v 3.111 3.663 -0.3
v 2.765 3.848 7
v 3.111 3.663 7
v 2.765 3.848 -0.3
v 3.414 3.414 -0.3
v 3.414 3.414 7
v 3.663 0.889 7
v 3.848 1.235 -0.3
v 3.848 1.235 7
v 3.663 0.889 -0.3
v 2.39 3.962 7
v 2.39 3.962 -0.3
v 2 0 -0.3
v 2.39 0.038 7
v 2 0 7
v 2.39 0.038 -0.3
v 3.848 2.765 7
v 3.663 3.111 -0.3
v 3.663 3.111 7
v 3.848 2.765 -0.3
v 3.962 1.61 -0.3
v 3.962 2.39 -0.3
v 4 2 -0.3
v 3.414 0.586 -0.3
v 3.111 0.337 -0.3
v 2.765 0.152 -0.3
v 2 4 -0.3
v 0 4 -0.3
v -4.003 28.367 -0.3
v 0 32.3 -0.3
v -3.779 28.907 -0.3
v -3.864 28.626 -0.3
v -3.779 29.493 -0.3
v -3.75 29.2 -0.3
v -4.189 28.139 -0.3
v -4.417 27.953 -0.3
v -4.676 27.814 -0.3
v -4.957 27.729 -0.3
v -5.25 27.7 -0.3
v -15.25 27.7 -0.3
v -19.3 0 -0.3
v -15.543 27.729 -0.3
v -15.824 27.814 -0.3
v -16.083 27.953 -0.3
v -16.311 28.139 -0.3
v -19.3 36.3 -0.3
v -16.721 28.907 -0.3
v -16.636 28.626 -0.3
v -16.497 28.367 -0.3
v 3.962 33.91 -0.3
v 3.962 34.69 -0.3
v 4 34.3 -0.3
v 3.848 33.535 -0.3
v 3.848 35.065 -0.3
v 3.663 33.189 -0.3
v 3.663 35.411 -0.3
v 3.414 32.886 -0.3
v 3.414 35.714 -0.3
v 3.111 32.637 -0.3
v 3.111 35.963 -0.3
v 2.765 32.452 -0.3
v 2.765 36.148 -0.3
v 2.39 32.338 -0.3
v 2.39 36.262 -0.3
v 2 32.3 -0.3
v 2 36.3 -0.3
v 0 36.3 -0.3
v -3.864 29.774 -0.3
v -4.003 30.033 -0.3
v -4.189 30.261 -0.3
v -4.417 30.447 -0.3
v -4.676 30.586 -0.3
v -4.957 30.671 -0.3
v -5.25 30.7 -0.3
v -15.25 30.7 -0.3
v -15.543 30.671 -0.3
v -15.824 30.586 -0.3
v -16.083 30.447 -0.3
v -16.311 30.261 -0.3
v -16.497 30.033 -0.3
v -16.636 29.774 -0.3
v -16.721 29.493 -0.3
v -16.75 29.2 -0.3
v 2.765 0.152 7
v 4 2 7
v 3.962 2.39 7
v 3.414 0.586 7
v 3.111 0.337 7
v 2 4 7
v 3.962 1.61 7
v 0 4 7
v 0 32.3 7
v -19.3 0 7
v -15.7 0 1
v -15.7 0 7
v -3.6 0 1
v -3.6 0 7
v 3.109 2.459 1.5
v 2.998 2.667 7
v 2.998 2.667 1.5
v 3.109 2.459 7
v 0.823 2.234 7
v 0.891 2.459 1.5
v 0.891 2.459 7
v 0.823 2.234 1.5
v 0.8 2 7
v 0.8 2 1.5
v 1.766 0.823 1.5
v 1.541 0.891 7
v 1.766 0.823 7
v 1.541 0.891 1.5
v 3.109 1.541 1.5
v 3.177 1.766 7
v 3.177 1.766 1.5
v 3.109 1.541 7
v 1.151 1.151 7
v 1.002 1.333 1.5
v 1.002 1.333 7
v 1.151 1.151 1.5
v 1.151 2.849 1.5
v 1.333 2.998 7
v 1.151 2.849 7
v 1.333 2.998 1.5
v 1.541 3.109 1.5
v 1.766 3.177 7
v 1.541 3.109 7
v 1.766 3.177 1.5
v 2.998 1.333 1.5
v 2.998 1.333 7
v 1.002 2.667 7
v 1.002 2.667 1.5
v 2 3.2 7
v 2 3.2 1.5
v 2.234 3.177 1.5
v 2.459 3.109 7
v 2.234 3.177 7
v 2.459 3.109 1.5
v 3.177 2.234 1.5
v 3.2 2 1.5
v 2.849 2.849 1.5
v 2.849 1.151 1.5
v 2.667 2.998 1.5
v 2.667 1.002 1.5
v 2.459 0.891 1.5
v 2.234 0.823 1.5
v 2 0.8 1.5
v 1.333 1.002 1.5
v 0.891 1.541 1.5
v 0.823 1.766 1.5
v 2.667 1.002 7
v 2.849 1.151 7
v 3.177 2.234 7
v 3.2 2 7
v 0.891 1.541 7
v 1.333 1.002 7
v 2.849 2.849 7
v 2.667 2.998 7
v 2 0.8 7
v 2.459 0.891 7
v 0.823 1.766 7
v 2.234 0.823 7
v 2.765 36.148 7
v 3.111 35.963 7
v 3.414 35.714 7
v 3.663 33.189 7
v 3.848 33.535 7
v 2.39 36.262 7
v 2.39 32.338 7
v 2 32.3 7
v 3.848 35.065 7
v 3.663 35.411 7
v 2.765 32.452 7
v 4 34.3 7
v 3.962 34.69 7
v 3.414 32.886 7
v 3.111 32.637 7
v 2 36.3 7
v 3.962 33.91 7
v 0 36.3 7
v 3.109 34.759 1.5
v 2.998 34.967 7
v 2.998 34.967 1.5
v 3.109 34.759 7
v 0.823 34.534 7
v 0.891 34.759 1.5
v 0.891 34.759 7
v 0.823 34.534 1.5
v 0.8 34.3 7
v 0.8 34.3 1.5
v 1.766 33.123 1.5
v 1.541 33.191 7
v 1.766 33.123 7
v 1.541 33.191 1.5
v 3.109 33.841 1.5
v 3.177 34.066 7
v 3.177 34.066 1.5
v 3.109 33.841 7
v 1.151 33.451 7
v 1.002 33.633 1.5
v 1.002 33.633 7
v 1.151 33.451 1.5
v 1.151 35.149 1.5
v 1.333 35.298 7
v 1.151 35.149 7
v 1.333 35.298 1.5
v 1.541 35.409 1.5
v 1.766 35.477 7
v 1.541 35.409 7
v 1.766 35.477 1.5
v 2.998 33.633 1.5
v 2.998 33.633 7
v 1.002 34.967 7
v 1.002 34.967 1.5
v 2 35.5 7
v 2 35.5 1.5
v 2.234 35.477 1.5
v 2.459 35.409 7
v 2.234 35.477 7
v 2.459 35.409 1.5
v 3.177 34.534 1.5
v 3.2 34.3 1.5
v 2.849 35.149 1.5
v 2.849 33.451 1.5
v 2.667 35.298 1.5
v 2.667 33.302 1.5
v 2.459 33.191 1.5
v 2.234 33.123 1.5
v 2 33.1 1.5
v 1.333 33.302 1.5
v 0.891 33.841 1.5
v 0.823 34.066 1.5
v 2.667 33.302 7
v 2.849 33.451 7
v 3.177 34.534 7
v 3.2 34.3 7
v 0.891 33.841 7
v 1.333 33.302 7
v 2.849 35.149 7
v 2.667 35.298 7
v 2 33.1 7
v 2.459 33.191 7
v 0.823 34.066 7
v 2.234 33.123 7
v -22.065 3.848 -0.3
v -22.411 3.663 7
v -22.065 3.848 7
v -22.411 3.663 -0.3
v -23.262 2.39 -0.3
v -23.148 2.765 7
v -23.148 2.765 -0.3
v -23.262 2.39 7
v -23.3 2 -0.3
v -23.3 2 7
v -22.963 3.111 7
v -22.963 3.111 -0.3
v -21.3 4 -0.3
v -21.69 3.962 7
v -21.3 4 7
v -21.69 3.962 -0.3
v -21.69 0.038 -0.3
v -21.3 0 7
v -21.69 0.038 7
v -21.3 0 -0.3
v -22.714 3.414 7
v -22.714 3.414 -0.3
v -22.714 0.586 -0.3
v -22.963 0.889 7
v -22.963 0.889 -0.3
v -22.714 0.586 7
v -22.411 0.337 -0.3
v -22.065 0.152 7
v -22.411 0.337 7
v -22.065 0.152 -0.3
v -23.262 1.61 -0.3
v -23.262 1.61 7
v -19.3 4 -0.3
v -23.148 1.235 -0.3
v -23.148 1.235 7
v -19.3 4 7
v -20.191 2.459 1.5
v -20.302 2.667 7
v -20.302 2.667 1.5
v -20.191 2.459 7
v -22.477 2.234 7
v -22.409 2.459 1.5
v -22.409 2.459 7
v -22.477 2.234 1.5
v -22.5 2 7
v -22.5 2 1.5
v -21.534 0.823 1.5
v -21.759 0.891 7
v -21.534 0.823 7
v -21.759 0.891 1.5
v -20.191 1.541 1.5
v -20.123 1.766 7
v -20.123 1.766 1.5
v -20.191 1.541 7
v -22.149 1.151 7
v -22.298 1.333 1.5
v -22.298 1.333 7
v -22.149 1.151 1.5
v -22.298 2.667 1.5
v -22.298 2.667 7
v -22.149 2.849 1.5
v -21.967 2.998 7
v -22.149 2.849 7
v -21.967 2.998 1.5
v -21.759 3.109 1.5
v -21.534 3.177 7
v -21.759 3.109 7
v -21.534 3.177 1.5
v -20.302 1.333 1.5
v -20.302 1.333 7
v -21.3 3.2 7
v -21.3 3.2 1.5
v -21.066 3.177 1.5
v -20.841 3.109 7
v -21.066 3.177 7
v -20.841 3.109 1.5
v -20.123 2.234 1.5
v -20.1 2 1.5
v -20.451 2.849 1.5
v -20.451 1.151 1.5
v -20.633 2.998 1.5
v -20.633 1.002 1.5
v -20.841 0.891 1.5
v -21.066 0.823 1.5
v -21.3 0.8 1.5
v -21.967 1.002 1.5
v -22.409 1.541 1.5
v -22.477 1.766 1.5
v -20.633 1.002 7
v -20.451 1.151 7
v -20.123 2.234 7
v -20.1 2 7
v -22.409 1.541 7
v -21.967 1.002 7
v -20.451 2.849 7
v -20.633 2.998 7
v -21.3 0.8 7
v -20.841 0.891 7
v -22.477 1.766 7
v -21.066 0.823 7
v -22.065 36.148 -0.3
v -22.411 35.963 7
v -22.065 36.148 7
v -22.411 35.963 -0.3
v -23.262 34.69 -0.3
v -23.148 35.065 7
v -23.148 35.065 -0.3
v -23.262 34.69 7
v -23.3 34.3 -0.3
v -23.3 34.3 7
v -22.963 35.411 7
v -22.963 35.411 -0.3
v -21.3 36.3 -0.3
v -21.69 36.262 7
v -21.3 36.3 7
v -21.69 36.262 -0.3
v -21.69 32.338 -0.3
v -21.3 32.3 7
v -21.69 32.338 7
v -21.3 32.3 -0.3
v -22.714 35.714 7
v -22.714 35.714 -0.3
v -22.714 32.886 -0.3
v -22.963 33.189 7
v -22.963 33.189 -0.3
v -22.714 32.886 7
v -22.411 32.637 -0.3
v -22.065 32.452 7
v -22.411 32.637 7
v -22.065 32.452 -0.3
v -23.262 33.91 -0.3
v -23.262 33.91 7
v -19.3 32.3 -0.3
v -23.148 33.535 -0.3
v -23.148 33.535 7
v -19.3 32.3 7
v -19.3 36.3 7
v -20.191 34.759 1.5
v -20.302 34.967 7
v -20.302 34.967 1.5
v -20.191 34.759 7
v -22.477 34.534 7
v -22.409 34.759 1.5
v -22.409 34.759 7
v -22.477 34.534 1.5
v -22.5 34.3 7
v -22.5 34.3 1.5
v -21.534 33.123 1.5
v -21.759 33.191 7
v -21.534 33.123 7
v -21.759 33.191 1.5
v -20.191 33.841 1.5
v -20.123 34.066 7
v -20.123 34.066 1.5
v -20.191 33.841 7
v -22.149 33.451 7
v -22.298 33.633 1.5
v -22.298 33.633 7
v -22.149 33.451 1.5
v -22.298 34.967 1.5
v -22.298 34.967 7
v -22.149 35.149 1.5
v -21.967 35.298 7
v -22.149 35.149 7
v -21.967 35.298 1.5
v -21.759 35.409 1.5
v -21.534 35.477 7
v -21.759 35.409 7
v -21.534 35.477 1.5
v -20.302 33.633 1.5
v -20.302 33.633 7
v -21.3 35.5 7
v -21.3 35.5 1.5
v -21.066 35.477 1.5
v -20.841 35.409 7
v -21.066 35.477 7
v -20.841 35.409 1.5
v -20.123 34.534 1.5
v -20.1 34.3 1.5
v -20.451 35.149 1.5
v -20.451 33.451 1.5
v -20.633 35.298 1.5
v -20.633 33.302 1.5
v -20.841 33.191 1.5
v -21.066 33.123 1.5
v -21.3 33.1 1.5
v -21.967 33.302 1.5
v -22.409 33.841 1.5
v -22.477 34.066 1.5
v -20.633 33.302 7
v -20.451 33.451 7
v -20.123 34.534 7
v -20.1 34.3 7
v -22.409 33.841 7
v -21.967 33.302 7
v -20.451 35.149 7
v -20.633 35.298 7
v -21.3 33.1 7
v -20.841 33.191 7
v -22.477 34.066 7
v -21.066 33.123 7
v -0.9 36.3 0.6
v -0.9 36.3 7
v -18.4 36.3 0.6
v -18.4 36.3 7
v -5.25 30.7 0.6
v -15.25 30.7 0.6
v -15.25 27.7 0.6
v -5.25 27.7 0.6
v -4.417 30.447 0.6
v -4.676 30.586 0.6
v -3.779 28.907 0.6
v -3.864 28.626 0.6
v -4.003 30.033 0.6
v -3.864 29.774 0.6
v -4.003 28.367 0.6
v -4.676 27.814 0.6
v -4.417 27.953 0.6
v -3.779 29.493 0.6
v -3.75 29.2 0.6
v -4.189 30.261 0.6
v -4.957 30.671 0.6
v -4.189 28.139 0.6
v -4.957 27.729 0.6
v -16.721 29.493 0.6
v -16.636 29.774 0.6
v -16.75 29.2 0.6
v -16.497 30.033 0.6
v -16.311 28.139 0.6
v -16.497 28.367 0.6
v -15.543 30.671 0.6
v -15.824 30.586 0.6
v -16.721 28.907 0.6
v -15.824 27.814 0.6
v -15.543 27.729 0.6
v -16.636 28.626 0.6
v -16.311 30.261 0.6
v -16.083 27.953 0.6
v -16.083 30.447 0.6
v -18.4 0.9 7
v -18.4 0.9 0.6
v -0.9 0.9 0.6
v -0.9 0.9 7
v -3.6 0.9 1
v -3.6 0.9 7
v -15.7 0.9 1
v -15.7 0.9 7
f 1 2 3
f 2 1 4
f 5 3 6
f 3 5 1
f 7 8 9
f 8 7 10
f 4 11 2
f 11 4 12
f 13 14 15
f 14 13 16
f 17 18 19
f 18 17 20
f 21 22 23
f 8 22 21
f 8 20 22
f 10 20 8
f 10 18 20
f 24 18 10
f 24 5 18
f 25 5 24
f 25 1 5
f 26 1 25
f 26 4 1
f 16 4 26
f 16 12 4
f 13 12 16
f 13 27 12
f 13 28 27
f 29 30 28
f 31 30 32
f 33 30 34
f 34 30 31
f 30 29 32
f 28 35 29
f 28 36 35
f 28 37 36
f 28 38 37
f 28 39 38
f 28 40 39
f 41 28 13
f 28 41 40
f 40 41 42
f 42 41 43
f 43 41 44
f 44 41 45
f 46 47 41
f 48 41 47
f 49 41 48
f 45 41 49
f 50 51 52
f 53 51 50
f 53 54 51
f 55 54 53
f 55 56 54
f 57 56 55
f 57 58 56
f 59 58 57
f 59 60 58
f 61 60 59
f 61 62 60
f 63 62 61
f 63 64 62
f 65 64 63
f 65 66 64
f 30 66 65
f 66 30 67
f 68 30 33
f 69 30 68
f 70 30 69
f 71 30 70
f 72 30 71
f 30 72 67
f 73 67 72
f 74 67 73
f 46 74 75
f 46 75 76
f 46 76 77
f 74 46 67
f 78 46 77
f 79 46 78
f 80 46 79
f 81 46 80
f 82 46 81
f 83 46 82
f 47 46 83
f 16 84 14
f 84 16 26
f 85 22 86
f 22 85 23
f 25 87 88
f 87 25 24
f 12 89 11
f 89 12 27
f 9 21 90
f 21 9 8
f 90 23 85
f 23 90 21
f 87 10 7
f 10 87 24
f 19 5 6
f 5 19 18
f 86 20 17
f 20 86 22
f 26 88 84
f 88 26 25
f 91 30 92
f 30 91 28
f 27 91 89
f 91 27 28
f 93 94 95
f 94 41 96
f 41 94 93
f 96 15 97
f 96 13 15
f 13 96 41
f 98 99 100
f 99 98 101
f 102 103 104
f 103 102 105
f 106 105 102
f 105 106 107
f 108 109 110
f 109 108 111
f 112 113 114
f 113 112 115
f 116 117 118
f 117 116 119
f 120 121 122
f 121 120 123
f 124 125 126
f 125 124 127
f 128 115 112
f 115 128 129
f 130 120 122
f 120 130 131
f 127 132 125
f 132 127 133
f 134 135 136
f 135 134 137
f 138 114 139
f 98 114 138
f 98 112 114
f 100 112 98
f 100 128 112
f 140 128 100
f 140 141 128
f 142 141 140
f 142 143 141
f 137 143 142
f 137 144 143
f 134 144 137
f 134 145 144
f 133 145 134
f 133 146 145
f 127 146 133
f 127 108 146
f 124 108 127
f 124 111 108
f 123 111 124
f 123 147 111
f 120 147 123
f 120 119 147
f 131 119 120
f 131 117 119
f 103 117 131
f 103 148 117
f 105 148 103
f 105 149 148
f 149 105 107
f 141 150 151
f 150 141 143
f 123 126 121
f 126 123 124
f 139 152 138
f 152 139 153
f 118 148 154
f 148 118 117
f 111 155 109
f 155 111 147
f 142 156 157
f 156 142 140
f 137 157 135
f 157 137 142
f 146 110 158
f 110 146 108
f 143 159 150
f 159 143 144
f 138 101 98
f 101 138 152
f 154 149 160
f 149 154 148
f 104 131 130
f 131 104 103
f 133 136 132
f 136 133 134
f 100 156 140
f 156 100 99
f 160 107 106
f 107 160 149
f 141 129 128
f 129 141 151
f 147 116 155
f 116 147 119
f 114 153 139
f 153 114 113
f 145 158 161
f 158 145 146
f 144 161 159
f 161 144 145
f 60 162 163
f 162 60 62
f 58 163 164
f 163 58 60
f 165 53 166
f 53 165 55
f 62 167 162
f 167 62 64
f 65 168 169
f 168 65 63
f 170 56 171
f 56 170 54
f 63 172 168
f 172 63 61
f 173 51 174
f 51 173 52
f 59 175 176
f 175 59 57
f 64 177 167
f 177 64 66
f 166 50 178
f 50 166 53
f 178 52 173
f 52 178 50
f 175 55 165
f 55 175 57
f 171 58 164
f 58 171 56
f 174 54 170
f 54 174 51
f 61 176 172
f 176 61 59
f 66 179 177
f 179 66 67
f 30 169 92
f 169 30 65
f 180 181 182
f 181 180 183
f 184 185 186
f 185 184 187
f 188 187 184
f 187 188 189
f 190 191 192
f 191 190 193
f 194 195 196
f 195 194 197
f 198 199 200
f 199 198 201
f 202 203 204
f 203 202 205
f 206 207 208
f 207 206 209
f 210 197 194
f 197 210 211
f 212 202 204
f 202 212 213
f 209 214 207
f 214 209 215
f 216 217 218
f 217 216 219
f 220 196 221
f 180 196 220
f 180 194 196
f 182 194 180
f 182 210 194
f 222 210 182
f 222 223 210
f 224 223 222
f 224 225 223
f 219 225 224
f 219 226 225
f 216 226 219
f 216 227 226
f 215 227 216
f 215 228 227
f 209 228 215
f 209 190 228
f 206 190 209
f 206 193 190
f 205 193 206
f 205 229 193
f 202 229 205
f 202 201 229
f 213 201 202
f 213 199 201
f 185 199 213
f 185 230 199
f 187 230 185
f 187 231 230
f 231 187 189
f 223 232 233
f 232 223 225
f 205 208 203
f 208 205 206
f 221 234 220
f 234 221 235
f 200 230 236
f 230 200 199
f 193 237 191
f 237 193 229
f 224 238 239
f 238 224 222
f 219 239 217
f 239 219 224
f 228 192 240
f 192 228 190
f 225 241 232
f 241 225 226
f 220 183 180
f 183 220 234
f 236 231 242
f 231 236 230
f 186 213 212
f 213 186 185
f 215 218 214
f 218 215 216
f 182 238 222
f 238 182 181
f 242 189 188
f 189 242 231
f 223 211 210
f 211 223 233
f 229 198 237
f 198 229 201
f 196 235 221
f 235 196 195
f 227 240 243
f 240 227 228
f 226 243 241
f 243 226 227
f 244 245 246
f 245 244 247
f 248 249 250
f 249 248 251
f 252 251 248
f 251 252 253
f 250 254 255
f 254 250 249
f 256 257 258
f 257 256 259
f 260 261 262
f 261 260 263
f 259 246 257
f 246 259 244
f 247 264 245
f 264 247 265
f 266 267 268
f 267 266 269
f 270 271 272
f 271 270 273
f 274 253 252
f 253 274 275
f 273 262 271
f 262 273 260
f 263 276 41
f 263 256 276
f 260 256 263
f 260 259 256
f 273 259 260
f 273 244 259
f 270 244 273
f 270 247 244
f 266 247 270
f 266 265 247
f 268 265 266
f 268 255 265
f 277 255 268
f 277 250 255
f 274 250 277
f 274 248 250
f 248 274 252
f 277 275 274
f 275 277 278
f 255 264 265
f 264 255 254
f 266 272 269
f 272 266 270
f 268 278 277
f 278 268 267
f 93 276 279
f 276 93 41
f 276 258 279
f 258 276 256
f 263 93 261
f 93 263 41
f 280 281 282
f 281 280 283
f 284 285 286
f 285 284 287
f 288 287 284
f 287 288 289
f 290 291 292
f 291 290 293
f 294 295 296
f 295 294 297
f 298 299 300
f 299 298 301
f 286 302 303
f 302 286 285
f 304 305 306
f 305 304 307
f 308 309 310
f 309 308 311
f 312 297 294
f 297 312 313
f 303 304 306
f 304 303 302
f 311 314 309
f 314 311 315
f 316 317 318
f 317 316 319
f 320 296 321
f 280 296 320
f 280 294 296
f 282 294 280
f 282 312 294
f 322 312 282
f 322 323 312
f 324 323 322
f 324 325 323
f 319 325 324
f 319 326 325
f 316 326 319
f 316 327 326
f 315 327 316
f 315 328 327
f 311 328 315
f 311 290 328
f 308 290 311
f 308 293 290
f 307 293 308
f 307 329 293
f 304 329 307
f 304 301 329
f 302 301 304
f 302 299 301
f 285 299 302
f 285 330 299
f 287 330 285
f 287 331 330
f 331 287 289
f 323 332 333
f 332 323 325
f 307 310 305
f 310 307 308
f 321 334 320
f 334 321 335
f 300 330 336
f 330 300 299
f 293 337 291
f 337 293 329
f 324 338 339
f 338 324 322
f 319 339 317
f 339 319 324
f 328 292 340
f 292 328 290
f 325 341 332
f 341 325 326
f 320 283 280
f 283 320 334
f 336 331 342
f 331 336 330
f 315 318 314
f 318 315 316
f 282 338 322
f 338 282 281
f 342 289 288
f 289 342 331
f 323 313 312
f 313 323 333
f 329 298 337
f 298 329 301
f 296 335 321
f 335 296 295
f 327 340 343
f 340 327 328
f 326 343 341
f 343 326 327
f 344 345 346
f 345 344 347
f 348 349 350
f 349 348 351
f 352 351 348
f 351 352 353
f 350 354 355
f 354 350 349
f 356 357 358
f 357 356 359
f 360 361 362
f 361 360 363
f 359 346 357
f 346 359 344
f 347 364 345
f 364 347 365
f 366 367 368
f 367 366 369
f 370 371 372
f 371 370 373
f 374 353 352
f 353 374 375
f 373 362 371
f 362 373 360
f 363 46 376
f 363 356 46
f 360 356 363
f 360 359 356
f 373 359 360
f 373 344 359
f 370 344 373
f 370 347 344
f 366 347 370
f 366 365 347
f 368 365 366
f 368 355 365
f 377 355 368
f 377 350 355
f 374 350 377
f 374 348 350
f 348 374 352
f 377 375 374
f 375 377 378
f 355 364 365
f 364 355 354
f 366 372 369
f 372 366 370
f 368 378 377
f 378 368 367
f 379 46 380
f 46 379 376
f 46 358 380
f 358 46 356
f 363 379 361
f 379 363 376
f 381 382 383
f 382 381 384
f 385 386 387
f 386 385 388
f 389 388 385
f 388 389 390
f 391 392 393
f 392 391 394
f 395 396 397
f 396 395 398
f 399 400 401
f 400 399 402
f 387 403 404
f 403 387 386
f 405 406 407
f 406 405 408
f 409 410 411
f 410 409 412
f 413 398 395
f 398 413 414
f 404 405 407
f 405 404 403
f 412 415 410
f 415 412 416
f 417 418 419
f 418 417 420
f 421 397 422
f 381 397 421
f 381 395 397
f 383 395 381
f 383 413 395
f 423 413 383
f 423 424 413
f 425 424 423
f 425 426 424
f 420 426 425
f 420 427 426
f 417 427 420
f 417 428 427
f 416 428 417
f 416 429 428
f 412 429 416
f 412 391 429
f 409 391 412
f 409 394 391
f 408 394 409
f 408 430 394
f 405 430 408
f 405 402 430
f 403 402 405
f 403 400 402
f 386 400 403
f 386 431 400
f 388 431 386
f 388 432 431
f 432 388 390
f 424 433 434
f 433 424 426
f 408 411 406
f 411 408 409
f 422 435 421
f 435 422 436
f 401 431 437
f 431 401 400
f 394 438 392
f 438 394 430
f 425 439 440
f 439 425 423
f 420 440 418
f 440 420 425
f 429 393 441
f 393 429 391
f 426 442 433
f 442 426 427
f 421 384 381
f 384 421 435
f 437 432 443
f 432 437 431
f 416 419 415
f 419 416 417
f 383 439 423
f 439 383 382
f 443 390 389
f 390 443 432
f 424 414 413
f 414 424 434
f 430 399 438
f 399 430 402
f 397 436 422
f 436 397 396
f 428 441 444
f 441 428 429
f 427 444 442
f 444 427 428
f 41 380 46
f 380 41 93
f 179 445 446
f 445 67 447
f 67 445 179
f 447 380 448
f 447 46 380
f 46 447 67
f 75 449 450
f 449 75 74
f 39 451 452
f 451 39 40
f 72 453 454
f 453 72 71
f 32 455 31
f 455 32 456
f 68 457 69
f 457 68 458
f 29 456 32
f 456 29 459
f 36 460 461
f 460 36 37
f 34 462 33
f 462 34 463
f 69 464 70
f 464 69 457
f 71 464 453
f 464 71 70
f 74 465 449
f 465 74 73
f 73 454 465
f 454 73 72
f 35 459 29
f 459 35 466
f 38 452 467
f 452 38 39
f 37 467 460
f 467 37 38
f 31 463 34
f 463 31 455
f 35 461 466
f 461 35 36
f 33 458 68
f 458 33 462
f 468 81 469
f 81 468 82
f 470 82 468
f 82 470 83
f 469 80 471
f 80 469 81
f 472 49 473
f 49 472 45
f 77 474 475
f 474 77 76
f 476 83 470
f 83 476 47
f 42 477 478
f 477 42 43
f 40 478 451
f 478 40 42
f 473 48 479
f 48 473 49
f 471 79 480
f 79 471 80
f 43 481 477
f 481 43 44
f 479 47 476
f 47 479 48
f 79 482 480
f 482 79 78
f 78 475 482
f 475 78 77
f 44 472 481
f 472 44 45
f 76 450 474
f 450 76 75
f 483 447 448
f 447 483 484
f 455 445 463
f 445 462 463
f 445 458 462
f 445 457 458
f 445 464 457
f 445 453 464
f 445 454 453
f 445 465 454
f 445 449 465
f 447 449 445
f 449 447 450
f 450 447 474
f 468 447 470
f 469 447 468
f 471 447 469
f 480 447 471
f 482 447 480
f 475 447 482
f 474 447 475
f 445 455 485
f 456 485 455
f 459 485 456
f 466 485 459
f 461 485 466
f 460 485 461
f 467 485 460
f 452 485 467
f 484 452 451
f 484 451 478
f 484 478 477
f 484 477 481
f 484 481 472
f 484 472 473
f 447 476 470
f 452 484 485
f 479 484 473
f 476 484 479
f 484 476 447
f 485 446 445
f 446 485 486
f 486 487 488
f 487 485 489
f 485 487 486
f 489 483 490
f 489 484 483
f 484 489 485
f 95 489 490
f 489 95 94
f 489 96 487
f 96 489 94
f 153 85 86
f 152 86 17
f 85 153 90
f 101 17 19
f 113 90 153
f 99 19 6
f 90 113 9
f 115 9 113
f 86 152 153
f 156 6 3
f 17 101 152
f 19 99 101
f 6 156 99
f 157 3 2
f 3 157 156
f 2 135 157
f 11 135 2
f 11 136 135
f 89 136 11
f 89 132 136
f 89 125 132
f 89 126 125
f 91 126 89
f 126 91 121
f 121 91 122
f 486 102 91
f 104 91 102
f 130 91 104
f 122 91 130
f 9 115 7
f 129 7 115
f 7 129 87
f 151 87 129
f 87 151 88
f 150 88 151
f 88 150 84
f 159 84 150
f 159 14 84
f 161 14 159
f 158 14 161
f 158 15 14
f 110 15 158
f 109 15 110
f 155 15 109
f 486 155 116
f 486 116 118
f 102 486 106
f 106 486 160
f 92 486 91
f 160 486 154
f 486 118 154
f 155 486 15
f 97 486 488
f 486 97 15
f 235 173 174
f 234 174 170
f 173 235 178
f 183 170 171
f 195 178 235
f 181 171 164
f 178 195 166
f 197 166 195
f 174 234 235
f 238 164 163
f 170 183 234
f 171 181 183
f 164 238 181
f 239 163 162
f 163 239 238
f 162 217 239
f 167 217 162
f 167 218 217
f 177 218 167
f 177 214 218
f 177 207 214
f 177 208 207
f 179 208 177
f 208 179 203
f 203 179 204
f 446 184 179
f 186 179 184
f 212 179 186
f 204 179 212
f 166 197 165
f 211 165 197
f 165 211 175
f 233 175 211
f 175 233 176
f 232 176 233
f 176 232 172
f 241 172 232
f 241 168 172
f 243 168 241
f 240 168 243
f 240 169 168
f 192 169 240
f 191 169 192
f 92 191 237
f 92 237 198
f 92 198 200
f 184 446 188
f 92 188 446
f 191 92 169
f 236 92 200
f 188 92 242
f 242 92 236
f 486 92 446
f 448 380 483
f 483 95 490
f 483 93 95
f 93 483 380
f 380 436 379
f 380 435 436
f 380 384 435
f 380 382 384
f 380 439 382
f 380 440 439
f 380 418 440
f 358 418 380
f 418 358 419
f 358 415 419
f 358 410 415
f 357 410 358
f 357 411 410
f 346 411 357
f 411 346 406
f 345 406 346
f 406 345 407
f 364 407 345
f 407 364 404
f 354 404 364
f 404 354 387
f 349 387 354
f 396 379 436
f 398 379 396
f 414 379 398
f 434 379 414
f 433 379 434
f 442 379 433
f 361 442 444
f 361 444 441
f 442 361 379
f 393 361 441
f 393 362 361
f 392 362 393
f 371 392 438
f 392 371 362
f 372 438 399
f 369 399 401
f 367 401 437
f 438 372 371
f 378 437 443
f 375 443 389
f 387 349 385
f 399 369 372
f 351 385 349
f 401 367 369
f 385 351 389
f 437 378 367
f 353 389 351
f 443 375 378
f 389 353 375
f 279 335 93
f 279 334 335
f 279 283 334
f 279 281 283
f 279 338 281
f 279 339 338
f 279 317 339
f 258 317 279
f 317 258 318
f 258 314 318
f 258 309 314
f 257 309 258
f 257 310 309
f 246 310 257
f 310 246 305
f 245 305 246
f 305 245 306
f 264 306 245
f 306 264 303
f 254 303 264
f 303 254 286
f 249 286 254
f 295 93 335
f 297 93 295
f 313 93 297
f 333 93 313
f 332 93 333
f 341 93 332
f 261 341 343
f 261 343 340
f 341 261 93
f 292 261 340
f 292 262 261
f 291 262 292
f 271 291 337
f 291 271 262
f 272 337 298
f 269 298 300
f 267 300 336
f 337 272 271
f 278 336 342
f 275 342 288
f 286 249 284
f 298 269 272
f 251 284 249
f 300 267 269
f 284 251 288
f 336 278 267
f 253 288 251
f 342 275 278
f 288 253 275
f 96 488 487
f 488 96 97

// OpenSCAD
//
// CP2102 USB to Serial Module Case by Russ Hughes
//	License:  Creative Commons Attribution-ShareAlike 4.0 International
//	http://creativecommons.org/licenses/by-sa/4.0/
//	
//

bw=17.5;
bl=34.5;
bt=8.5;

th= 0.45*2;
st= th*2;

label_font = "Stencil Gothic";		// font to use for label
label = 1;							// 1 to print label

print_upper=0;						// 1 to print upper part
print_lower=1;						// 1 to print lower part

module upper_screw(){
	difference() {
		union() {
			cylinder(d=4,h=bt+st, $fn=32);
			translate([0,-2,0])
				cube([2,4,bt+st]);
		}
		cylinder(d=2.4, h=bt, $fn=32);
	}
}

module lower_screw(){
	difference() {
		union() {
			cylinder(d=4,h=bt+st, $fn=32);
			translate([-2,-2,0])
				cube([2,4,bt+st]);
		}
		cylinder(d=2.4, h=bt, $fn=32);
	}
}

module shell_outer() {
	cube([bw+st,bl+st,bt+st]);
	translate([-2,2,0]) 
		upper_screw();

	translate([-2,bl+st-2,0]) 
		upper_screw();

	translate([bw+3.8,2,0]) 
		lower_screw();

	translate([bw+3.8,bl+st-2,0]) 
		lower_screw();
	
}

module shell_lower() {
	difference() {
		shell_outer();
		translate([th,th,th])
			cube([bw,bl+1,bt]);

		translate([(bw+st)/2-(12.10/2), -1, 3])
			cube([12.10,10, 6]);
		
		translate([(bw+st)/2-(2.4/2)+st, bl+1.2-7, 8])
		{
			$fn=32;
			
			translate([-5,-1,0]) 
				cube([10,3,3]);
			
			translate([-5,0.5,0]) 
				cylinder(d=3, h=3);
			
			translate([5,0.5,0]) 
				cylinder(d=3, h=3);
		}
	}
}

module shell_upper() {
	difference() {
		shell_outer();
		translate([th,th,th])
			cube([bw,bl,bt]);
		translate([(bw)/2-8+th, 2, 0])
			cube([16,5,3]);
		
		if (label) { 
			translate([12,35,.45])
				rotate([0,180,90])
				linear_extrude(height=4)
					#text("CP2102", font=label_font, size=6);
		}
	}
}

if (print_lower) {
	translate([0,0,10])
	rotate([0,180,0]) {
		difference() {
			shell_lower();
			translate([-25,-1,-1])
				cube([50,50,4]);
		}
	}
}

if (print_upper) {
	translate([10,0,0])

	difference() {
		shell_upper();
		translate([-25,-1,3])
			cube([50,50,12]);
	}
}
